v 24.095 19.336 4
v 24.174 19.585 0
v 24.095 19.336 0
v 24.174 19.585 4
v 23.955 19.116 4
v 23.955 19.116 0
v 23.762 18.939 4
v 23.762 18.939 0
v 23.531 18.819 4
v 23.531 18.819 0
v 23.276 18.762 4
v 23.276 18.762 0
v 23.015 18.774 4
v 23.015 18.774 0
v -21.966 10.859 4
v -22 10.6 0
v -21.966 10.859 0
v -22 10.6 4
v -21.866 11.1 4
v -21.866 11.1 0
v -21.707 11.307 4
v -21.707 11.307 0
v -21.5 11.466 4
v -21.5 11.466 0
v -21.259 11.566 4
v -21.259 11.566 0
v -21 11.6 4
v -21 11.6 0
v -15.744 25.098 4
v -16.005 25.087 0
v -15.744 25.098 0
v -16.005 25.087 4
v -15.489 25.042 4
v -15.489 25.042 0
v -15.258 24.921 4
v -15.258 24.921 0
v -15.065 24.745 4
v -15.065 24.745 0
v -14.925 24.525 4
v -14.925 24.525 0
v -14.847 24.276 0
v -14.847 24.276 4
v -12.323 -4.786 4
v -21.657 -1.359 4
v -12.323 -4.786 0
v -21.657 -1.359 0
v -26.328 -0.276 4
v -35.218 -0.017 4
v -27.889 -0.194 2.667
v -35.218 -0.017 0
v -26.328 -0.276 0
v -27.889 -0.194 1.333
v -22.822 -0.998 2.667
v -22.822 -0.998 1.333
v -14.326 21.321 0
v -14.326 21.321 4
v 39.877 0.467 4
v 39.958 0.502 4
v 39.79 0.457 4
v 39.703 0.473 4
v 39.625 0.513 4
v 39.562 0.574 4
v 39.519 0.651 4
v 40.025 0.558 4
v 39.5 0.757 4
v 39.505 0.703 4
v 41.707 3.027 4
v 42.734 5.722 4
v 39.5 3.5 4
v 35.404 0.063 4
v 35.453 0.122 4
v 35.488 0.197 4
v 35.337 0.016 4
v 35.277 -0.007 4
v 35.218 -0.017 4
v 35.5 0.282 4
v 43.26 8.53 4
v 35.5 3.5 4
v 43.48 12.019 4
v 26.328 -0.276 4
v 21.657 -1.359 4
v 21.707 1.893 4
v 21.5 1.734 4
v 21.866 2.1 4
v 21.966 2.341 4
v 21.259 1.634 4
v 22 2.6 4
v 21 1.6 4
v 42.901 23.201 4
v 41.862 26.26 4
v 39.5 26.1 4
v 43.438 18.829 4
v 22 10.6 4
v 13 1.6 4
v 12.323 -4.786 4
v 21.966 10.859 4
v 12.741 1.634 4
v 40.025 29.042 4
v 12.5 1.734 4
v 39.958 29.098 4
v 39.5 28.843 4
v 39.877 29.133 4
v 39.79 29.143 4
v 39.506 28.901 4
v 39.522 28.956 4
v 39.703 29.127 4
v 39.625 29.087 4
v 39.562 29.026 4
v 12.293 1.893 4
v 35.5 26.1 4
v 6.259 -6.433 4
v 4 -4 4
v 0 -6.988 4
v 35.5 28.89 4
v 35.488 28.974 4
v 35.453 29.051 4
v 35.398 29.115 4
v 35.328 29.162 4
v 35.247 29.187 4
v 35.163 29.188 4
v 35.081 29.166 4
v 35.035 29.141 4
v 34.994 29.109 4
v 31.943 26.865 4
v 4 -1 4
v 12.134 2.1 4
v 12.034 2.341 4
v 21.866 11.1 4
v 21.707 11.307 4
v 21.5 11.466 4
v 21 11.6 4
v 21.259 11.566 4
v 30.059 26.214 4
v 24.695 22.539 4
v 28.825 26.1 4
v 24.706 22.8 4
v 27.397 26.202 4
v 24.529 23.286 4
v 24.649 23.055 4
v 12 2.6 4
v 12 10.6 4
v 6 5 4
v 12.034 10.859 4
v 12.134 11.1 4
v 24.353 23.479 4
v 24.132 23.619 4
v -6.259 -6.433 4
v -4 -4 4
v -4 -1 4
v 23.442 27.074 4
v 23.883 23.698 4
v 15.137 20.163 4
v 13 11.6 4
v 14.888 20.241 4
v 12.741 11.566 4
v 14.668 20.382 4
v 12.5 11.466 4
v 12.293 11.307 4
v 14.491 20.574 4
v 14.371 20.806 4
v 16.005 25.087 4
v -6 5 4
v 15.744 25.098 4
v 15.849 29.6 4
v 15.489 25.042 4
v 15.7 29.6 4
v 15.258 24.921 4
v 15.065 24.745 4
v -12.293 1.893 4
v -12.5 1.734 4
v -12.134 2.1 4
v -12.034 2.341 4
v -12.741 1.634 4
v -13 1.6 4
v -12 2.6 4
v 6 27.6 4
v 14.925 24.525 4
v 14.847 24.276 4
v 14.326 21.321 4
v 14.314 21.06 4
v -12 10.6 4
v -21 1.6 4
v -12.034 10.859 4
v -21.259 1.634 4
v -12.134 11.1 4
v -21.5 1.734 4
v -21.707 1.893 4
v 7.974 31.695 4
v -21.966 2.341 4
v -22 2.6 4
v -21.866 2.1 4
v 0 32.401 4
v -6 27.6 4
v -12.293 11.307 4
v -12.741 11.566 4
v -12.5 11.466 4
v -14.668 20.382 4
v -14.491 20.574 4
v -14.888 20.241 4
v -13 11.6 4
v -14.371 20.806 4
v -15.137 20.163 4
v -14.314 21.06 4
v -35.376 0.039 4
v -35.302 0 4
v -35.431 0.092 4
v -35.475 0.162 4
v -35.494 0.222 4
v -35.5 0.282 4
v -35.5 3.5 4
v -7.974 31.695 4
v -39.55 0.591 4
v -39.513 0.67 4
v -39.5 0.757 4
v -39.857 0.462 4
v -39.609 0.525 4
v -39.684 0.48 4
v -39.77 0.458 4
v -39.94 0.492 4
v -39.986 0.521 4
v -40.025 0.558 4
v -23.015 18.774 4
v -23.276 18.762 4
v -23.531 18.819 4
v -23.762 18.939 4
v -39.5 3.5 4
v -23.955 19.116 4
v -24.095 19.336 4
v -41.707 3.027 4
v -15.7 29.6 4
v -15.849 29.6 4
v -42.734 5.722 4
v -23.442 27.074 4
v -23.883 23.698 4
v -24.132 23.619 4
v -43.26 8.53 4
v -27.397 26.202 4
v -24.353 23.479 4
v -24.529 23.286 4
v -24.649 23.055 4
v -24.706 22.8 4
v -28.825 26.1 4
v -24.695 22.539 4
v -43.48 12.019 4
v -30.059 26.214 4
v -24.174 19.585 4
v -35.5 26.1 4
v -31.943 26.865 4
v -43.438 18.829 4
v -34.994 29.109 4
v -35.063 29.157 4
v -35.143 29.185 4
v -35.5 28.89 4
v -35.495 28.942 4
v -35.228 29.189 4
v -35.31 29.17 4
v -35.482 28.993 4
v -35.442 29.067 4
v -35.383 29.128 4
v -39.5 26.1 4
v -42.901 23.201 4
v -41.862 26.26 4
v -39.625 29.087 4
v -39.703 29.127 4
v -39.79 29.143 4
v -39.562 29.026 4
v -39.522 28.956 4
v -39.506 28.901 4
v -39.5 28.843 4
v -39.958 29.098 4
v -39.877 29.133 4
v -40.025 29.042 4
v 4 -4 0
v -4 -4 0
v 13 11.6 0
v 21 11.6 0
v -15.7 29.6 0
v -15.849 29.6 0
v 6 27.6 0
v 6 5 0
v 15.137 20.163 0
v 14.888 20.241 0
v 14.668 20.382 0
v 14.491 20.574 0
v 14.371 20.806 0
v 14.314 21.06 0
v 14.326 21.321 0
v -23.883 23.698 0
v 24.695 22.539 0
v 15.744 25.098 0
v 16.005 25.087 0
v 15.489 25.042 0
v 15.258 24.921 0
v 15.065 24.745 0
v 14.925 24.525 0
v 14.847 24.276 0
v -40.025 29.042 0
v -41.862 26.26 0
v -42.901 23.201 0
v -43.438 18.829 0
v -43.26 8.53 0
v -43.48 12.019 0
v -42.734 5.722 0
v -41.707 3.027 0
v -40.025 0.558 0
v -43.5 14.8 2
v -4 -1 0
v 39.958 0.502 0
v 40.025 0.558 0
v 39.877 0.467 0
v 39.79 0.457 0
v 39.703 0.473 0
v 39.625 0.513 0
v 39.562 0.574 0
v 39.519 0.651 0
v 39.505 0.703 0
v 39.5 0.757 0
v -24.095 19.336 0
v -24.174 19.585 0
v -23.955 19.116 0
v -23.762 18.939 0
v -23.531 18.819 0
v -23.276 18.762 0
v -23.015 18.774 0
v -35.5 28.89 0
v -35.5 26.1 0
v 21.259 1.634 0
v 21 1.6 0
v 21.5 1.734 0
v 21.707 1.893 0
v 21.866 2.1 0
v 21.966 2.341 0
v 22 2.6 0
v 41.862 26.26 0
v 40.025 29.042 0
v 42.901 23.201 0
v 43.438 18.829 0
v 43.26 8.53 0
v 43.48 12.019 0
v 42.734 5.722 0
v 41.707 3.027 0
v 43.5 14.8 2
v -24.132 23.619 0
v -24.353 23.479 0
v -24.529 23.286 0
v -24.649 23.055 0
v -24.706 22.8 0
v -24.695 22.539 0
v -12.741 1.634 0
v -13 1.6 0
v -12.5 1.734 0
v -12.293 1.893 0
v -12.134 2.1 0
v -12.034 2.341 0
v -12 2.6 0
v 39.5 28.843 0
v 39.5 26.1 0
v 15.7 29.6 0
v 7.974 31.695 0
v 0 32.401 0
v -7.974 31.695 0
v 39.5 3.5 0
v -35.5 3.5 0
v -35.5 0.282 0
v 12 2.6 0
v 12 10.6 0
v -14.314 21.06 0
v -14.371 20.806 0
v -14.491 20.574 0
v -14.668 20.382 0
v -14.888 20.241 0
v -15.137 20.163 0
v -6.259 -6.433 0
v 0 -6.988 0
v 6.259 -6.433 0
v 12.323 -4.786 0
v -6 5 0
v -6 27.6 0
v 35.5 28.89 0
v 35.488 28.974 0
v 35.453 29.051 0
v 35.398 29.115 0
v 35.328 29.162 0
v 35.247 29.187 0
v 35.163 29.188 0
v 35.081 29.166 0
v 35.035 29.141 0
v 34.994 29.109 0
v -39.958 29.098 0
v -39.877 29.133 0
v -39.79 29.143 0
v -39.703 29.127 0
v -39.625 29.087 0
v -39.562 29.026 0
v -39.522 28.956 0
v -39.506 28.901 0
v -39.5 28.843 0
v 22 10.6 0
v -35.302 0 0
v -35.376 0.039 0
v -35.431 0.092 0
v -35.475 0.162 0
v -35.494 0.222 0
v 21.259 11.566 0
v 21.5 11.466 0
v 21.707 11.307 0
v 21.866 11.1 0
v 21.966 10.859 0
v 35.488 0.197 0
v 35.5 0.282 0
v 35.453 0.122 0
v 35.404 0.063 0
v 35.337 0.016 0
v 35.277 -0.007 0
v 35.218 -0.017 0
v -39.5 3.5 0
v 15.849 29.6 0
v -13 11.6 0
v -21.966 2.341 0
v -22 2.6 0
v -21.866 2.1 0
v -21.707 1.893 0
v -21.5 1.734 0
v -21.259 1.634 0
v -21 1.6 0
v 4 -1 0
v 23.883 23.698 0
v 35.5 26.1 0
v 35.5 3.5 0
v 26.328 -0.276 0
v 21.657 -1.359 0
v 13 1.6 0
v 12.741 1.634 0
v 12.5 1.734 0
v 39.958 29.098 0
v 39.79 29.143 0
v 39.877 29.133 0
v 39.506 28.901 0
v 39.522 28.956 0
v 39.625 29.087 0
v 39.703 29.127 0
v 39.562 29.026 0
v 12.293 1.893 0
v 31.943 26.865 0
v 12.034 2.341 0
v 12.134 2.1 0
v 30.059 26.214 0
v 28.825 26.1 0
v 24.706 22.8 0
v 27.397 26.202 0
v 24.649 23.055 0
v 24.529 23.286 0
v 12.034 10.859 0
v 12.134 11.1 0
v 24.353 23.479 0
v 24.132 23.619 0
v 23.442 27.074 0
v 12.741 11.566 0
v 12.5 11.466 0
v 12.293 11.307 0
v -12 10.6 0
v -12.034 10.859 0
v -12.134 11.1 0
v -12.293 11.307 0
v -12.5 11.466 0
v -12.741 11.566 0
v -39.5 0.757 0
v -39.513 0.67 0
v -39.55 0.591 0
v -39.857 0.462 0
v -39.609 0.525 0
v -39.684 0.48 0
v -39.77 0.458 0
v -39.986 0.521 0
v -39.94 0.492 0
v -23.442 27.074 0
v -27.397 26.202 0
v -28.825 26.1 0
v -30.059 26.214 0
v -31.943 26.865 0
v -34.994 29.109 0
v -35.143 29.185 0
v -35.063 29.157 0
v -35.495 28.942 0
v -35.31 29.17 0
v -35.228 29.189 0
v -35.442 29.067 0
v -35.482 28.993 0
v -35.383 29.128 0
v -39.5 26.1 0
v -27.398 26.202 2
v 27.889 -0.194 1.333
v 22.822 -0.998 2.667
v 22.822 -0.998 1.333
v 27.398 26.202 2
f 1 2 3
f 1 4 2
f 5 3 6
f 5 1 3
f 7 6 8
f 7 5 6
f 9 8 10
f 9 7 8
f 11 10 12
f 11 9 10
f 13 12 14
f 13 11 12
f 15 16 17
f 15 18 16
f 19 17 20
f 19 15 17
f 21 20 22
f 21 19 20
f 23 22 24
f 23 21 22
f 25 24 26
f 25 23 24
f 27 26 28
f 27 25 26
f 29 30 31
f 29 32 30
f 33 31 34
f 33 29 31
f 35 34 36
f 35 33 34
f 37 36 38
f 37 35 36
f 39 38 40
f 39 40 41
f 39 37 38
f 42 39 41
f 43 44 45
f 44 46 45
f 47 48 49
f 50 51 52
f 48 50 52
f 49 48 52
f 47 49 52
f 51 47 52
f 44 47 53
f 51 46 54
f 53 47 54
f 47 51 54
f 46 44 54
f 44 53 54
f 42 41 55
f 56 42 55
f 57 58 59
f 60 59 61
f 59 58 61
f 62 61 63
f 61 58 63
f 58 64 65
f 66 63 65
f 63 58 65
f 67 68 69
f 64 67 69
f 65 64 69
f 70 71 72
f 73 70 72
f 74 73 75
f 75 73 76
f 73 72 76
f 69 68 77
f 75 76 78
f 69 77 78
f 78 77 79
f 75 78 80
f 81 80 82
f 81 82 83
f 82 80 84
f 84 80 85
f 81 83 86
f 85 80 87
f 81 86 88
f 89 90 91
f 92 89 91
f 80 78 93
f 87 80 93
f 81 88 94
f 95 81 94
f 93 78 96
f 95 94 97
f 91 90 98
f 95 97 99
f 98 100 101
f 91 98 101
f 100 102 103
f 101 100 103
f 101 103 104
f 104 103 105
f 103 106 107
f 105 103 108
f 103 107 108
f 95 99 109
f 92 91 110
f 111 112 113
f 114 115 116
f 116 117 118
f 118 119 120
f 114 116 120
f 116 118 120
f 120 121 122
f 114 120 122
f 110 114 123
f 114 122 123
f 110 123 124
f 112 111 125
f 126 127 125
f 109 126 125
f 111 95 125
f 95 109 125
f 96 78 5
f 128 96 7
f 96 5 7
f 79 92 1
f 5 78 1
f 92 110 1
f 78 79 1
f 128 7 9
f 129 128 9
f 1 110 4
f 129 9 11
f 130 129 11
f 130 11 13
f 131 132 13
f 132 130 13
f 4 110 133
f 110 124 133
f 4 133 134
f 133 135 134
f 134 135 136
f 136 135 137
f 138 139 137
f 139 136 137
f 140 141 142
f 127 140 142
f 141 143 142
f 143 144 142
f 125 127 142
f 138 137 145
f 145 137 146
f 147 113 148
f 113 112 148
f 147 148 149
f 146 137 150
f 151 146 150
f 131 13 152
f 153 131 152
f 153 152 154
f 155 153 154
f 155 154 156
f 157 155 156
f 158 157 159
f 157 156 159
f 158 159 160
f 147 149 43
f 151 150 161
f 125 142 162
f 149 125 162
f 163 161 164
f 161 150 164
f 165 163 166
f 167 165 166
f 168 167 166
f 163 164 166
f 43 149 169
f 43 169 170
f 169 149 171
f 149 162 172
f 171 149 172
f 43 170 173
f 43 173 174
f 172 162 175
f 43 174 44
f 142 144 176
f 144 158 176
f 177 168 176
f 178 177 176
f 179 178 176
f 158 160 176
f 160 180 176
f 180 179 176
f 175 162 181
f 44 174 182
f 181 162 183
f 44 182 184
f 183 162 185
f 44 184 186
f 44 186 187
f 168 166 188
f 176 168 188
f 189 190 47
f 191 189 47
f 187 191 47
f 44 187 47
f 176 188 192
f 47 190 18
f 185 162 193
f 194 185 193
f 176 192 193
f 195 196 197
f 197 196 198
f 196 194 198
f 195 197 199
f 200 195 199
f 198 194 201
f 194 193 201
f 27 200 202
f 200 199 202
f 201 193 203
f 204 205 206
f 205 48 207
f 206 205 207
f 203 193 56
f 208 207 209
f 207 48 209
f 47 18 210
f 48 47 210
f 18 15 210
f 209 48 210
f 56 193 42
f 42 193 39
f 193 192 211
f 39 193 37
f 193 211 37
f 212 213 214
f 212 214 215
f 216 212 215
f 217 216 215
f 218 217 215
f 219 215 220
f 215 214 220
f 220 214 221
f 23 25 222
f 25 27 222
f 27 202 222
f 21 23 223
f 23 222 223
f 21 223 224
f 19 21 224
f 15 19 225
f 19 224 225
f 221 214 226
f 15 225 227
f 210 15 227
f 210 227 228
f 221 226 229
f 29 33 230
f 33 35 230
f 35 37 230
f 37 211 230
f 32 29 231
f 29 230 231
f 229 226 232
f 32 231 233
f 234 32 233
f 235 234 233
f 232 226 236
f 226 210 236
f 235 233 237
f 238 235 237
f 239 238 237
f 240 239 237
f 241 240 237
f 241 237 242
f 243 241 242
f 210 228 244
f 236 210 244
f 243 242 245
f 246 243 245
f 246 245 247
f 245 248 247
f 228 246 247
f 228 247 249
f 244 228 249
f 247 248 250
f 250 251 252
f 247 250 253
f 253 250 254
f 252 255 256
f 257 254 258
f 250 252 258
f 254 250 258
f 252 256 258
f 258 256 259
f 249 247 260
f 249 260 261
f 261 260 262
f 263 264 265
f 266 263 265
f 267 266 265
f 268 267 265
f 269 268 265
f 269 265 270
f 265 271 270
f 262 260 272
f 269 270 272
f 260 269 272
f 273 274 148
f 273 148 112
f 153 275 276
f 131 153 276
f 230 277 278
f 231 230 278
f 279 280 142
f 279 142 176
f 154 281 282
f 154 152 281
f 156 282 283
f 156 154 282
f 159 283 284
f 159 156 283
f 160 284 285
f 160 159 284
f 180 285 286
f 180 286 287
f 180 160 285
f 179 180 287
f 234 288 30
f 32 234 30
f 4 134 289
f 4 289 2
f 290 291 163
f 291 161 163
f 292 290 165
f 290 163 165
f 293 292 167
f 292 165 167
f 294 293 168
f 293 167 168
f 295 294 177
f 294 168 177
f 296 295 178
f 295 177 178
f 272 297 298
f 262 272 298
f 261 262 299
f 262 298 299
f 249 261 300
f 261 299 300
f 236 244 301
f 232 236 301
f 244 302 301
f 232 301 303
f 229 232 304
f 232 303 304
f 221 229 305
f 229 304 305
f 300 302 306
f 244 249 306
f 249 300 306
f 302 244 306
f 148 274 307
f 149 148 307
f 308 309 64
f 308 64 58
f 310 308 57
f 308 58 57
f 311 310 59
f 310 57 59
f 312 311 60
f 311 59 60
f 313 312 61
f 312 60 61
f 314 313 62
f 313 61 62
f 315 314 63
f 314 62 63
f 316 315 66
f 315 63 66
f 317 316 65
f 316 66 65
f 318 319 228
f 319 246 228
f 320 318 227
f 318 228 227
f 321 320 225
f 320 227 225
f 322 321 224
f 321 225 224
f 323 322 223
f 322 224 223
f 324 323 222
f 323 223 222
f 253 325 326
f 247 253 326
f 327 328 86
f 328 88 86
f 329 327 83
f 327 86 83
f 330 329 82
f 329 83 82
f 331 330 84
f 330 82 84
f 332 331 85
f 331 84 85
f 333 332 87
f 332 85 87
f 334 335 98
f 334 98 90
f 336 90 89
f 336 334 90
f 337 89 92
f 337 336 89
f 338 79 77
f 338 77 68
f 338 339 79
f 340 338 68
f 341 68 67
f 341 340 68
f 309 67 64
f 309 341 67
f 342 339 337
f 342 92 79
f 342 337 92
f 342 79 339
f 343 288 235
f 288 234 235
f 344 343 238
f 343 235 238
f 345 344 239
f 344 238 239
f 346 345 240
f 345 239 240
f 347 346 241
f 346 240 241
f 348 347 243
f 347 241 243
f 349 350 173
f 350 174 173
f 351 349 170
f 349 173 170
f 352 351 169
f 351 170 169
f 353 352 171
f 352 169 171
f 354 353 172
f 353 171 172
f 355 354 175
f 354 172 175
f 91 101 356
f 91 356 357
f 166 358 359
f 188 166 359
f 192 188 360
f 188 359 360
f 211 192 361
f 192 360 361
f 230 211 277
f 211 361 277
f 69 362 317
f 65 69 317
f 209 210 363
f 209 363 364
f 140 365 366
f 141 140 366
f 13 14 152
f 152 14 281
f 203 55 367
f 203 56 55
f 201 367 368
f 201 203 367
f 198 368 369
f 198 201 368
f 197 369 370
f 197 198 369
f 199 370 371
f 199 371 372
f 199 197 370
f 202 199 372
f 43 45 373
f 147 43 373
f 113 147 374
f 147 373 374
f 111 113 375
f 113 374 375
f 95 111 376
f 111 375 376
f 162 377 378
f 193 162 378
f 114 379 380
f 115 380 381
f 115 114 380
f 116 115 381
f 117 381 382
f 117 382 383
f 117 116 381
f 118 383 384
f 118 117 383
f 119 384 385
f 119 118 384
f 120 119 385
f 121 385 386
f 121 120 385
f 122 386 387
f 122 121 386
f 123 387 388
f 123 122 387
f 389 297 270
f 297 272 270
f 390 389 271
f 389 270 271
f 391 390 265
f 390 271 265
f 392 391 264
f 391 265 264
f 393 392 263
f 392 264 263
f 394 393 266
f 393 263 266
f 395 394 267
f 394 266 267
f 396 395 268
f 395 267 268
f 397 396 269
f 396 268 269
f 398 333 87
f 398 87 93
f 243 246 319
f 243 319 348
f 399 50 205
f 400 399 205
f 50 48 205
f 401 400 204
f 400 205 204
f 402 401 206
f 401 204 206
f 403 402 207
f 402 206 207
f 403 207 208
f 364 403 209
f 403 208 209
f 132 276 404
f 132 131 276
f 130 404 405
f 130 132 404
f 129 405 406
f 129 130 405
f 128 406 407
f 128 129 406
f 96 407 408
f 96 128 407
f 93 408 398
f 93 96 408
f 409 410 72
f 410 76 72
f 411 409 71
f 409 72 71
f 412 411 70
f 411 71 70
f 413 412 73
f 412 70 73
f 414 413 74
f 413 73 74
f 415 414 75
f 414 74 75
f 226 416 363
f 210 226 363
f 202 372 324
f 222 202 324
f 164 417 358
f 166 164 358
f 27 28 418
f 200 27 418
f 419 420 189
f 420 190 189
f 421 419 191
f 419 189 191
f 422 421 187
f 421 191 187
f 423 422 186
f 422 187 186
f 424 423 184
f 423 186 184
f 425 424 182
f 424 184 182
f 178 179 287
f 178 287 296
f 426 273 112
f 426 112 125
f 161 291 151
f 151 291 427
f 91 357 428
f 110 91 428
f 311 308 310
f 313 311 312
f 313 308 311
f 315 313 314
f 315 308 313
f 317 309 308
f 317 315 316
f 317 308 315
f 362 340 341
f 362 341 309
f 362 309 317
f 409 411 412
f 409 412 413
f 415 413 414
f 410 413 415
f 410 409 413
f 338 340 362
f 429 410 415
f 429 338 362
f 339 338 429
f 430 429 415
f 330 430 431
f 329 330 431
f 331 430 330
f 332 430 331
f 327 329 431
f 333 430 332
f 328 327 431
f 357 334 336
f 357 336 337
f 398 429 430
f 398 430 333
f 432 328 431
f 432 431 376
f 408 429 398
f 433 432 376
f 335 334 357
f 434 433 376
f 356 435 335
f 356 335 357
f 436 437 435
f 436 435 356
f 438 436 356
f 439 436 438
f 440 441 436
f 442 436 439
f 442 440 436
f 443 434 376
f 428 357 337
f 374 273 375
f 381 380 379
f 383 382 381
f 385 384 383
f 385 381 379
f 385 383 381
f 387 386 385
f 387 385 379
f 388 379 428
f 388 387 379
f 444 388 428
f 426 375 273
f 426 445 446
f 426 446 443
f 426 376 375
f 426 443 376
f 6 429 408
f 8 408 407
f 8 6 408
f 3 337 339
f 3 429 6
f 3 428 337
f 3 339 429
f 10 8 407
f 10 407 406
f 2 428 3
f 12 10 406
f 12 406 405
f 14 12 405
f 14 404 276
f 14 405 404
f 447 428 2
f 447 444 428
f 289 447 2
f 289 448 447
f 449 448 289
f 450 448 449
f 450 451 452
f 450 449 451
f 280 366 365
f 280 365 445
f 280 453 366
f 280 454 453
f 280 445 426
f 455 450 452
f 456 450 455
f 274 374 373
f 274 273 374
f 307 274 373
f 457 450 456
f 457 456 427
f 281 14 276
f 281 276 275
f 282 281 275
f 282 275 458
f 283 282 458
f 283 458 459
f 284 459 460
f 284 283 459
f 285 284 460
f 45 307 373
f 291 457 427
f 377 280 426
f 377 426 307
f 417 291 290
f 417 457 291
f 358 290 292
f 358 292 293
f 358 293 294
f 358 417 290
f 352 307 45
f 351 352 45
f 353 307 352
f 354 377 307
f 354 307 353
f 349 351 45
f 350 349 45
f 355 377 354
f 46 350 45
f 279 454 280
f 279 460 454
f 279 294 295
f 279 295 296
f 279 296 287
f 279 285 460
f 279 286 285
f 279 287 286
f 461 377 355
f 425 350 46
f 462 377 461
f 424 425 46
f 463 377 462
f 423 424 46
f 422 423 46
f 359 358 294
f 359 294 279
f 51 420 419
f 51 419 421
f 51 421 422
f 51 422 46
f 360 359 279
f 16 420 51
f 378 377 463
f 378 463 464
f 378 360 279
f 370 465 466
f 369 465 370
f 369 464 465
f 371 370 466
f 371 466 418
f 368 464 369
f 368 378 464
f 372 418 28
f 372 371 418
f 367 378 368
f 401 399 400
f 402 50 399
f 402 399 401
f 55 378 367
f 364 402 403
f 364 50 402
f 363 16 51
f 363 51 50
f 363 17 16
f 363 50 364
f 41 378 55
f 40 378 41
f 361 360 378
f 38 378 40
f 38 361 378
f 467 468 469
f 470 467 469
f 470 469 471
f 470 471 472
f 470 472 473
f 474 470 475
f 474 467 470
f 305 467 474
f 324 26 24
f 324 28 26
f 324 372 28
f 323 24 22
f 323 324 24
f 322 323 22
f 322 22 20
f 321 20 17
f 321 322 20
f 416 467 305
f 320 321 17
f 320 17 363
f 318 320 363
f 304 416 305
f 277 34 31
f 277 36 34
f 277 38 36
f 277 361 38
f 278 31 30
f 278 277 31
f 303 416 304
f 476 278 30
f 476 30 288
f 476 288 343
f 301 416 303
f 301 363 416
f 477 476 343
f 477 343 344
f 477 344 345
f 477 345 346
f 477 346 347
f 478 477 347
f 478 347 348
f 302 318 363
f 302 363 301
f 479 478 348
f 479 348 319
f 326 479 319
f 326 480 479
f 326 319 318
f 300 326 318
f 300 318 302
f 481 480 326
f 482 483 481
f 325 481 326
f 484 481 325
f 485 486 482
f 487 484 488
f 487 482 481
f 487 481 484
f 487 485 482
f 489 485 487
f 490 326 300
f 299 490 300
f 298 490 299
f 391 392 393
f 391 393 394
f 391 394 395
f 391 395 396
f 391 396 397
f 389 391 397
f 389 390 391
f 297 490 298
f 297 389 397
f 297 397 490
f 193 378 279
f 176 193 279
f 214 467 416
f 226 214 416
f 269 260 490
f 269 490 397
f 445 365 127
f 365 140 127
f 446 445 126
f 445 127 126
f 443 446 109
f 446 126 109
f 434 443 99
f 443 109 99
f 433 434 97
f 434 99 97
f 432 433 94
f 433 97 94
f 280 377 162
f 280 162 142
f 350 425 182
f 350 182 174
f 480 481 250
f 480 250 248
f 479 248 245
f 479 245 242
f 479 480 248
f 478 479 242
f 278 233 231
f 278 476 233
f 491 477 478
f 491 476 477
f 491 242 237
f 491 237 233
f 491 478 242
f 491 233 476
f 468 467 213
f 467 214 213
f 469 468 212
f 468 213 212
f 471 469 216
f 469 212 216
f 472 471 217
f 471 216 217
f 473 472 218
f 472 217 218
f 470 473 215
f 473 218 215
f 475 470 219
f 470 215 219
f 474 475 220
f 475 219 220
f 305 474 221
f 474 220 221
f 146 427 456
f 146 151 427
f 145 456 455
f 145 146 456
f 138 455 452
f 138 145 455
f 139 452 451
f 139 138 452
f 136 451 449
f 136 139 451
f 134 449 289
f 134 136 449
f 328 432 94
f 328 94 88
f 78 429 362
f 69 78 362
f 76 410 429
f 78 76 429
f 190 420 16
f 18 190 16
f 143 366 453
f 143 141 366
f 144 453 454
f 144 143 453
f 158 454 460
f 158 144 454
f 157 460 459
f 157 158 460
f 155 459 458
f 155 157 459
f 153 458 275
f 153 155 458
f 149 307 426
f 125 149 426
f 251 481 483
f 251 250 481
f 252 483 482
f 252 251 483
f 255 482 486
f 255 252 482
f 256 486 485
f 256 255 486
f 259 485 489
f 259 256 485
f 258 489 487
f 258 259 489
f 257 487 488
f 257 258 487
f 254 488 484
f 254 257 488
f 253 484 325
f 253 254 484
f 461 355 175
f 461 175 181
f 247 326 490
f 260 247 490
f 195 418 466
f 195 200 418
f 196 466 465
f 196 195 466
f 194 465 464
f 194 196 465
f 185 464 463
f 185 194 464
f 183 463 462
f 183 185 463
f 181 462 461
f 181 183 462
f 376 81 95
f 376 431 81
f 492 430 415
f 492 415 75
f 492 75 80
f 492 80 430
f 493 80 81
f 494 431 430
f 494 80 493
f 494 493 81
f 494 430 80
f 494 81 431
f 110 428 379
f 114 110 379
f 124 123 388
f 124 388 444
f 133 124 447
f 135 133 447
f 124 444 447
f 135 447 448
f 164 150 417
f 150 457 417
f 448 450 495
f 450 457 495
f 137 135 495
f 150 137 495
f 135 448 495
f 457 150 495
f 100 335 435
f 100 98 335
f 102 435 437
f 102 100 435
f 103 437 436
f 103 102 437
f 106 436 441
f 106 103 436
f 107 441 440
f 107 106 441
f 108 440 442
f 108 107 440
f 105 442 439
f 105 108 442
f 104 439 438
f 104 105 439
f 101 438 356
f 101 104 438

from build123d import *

# Parameters (mm, degrees)
ESTRUSIONE_ESTRUSIONE1_OUTLINE_W   = 10
ESTRUSIONE_ESTRUSIONE1_OUTLINE_H   = 10
ESTRUSIONE_ESTRUSIONE1_OUTLINE_W_2 = 8
ESTRUSIONE_ESTRUSIONE1_OUTLINE_H_2 = 3
ESTRUSIONE_ESTRUSIONE1_OUTLINE_W_3 = 12
ESTRUSIONE_ESTRUSIONE1_OUTLINE_H_3 = 22.6
ESTRUSIONE_ESTRUSIONE1_DEPTH       = 4
RACCORDO1_R                        = 1
RACCORDO3_R                        = 1
RACCORDO4_R                        = 0.3


# Read off the part's stored shape, not the designer's step: Estrusione-Estrusione1
with BuildPart() as part:
    # Estrusione-Estrusione1 outline → Estrusione-Estrusione1 (new body)
    with BuildSketch(Plane.XY):
        with BuildLine():
            add(Edge.make_bspline(
                [(39.5, 29.6), (43.506938427, 25.593061573), (43.493061573, 14.8), (43.506938427, 4.006938427), (39.5, 0)],
                knots=[0, 0, 0, 0, 0.5, 1, 1, 1, 1], degree=3))
            Line((39.5, 29.6), (39.5, 26.1))
            Line((39.5, 26.1), (35.5, 26.1))
            Line((35.5, 26.1), (35.5, 29.6))
            add(Edge.make_bspline(
                [(35.5, 29.6), (31.962623794, 26.062612753), (26.4060962, 25.659880805), (20.342579531, 28.112334068), (15.848598331, 29.600000017)],
                knots=[0, 0, 0, 0, 0.358970883, 0.890087037, 0.890087037, 0.890087037, 0.890087037], degree=3))
            Line((15.848598331, 29.600000017), (15.7, 29.6))
            ThreePointArc((15.7, 29.6), (0, 32.400991179), (-15.7, 29.6))
            Line((-15.7, 29.6), (-15.848598331, 29.600000017))
            add(Edge.make_bspline(
                [(-35.5, 29.6), (-31.962623794, 26.062612753), (-26.4060962, 25.659880805), (-20.342579531, 28.112334068), (-15.848598331, 29.600000017)],
                knots=[0, 0, 0, 0, 0.358970883, 0.890087037, 0.890087037, 0.890087037, 0.890087037], degree=3))
            Line((-35.5, 29.6), (-35.5, 26.1))
            Line((-35.5, 26.1), (-39.5, 26.1))
            Line((-39.5, 26.1), (-39.5, 29.6))
            add(Edge.make_bspline(
                [(-39.5, 29.6), (-43.506938427, 25.593061573), (-43.493061573, 14.8), (-43.506938427, 4.006938427), (-39.5, 0)],
                knots=[0, 0, 0, 0, 0.5, 1, 1, 1, 1], degree=3))
            Line((-39.5, 0), (-39.5, 3.5))
            Line((-39.5, 3.5), (-35.5, 3.5))
            Line((-35.5, 3.5), (-35.5, 0))
            add(Edge.make_bspline(
                [(-35.5, 0), (-24.124671667, -0.699725618), (-28.237292398, 1.331108434), (-12.322535381, -4.786451171)],
                knots=[0, 0, 0, 0, 1, 1, 1, 1], degree=3))
            ThreePointArc((-12.322535381, -4.786451171), (0, -6.987919299), (12.322535381, -4.786451171))
            add(Edge.make_bspline(
                [(35.5, 0), (24.124671667, -0.699725618), (28.237292398, 1.331108434), (12.322535381, -4.786451171)],
                knots=[0, 0, 0, 0, 1, 1, 1, 1], degree=3))
            Line((35.5, 0), (35.5, 3.5))
            Line((35.5, 3.5), (39.5, 3.5))
            Line((39.5, 3.5), (39.5, 0))
        make_face()
        with Locations((-17, 6.6)):
            Rectangle(ESTRUSIONE_ESTRUSIONE1_OUTLINE_W, ESTRUSIONE_ESTRUSIONE1_OUTLINE_H, mode=Mode.SUBTRACT)
        with Locations((0, -2.5)):
            Rectangle(ESTRUSIONE_ESTRUSIONE1_OUTLINE_W_2, ESTRUSIONE_ESTRUSIONE1_OUTLINE_H_2, mode=Mode.SUBTRACT)
        with Locations((17, 6.6)):
            Rectangle(ESTRUSIONE_ESTRUSIONE1_OUTLINE_W, ESTRUSIONE_ESTRUSIONE1_OUTLINE_H, mode=Mode.SUBTRACT)
        Polygon((-24.868240888, 23.524038765), (-15.020163358, 25.260520542), (-14.15192247, 20.336481777), (-24, 18.6), align=None, mode=Mode.SUBTRACT)
        with Locations((0, 16.3)):
            Rectangle(ESTRUSIONE_ESTRUSIONE1_OUTLINE_W_3, ESTRUSIONE_ESTRUSIONE1_OUTLINE_H_3, mode=Mode.SUBTRACT)
        Polygon((15.020163358, 25.260520542), (24.868240888, 23.524038765), (24, 18.6), (14.15192247, 20.336481777), align=None, mode=Mode.SUBTRACT)
    extrude(amount=ESTRUSIONE_ESTRUSIONE1_DEPTH)

    # Raccordo1
    raccordo1_edges = [part.edges().sort_by_distance(p)[0] for p in [
        (15.020163358, 25.260520542, 2),
        (14.15192247, 20.336481777, 2),
        (24, 18.6, 2),
        (24.868240888, 23.524038765, 2),
        (-24.868240888, 23.524038765, 2),
        (-24, 18.6, 2),
        (-14.15192247, 20.336481777, 2),
        (-15.020163358, 25.260520542, 2),
    ]]
    fillet(raccordo1_edges, radius=RACCORDO1_R)

    # Raccordo3
    raccordo3_edges = [part.edges().sort_by_distance(p)[0] for p in [
        (12, 11.6, 2),
        (12, 1.6, 2),
        (22, 1.6, 2),
        (22, 11.6, 2),
        (-22, 11.6, 2),
        (-22, 1.6, 2),
        (-12, 1.6, 2),
        (-12, 11.6, 2),
    ]]
    fillet(raccordo3_edges, radius=RACCORDO3_R)

    # Raccordo4
    raccordo4_edges = [part.edges().sort_by_distance(p)[0] for p in [
        (-35.5, 0, 2),
        (-39.5, 0, 2),
        (35.5, 0, 2),
        (39.5, 0, 2),
        (39.5, 29.6, 2),
        (35.5, 29.6, 2),
        (-39.5, 29.6, 2),
        (-35.5, 29.6, 2),
    ]]
    fillet(raccordo4_edges, radius=RACCORDO4_R)


solid = part.part
